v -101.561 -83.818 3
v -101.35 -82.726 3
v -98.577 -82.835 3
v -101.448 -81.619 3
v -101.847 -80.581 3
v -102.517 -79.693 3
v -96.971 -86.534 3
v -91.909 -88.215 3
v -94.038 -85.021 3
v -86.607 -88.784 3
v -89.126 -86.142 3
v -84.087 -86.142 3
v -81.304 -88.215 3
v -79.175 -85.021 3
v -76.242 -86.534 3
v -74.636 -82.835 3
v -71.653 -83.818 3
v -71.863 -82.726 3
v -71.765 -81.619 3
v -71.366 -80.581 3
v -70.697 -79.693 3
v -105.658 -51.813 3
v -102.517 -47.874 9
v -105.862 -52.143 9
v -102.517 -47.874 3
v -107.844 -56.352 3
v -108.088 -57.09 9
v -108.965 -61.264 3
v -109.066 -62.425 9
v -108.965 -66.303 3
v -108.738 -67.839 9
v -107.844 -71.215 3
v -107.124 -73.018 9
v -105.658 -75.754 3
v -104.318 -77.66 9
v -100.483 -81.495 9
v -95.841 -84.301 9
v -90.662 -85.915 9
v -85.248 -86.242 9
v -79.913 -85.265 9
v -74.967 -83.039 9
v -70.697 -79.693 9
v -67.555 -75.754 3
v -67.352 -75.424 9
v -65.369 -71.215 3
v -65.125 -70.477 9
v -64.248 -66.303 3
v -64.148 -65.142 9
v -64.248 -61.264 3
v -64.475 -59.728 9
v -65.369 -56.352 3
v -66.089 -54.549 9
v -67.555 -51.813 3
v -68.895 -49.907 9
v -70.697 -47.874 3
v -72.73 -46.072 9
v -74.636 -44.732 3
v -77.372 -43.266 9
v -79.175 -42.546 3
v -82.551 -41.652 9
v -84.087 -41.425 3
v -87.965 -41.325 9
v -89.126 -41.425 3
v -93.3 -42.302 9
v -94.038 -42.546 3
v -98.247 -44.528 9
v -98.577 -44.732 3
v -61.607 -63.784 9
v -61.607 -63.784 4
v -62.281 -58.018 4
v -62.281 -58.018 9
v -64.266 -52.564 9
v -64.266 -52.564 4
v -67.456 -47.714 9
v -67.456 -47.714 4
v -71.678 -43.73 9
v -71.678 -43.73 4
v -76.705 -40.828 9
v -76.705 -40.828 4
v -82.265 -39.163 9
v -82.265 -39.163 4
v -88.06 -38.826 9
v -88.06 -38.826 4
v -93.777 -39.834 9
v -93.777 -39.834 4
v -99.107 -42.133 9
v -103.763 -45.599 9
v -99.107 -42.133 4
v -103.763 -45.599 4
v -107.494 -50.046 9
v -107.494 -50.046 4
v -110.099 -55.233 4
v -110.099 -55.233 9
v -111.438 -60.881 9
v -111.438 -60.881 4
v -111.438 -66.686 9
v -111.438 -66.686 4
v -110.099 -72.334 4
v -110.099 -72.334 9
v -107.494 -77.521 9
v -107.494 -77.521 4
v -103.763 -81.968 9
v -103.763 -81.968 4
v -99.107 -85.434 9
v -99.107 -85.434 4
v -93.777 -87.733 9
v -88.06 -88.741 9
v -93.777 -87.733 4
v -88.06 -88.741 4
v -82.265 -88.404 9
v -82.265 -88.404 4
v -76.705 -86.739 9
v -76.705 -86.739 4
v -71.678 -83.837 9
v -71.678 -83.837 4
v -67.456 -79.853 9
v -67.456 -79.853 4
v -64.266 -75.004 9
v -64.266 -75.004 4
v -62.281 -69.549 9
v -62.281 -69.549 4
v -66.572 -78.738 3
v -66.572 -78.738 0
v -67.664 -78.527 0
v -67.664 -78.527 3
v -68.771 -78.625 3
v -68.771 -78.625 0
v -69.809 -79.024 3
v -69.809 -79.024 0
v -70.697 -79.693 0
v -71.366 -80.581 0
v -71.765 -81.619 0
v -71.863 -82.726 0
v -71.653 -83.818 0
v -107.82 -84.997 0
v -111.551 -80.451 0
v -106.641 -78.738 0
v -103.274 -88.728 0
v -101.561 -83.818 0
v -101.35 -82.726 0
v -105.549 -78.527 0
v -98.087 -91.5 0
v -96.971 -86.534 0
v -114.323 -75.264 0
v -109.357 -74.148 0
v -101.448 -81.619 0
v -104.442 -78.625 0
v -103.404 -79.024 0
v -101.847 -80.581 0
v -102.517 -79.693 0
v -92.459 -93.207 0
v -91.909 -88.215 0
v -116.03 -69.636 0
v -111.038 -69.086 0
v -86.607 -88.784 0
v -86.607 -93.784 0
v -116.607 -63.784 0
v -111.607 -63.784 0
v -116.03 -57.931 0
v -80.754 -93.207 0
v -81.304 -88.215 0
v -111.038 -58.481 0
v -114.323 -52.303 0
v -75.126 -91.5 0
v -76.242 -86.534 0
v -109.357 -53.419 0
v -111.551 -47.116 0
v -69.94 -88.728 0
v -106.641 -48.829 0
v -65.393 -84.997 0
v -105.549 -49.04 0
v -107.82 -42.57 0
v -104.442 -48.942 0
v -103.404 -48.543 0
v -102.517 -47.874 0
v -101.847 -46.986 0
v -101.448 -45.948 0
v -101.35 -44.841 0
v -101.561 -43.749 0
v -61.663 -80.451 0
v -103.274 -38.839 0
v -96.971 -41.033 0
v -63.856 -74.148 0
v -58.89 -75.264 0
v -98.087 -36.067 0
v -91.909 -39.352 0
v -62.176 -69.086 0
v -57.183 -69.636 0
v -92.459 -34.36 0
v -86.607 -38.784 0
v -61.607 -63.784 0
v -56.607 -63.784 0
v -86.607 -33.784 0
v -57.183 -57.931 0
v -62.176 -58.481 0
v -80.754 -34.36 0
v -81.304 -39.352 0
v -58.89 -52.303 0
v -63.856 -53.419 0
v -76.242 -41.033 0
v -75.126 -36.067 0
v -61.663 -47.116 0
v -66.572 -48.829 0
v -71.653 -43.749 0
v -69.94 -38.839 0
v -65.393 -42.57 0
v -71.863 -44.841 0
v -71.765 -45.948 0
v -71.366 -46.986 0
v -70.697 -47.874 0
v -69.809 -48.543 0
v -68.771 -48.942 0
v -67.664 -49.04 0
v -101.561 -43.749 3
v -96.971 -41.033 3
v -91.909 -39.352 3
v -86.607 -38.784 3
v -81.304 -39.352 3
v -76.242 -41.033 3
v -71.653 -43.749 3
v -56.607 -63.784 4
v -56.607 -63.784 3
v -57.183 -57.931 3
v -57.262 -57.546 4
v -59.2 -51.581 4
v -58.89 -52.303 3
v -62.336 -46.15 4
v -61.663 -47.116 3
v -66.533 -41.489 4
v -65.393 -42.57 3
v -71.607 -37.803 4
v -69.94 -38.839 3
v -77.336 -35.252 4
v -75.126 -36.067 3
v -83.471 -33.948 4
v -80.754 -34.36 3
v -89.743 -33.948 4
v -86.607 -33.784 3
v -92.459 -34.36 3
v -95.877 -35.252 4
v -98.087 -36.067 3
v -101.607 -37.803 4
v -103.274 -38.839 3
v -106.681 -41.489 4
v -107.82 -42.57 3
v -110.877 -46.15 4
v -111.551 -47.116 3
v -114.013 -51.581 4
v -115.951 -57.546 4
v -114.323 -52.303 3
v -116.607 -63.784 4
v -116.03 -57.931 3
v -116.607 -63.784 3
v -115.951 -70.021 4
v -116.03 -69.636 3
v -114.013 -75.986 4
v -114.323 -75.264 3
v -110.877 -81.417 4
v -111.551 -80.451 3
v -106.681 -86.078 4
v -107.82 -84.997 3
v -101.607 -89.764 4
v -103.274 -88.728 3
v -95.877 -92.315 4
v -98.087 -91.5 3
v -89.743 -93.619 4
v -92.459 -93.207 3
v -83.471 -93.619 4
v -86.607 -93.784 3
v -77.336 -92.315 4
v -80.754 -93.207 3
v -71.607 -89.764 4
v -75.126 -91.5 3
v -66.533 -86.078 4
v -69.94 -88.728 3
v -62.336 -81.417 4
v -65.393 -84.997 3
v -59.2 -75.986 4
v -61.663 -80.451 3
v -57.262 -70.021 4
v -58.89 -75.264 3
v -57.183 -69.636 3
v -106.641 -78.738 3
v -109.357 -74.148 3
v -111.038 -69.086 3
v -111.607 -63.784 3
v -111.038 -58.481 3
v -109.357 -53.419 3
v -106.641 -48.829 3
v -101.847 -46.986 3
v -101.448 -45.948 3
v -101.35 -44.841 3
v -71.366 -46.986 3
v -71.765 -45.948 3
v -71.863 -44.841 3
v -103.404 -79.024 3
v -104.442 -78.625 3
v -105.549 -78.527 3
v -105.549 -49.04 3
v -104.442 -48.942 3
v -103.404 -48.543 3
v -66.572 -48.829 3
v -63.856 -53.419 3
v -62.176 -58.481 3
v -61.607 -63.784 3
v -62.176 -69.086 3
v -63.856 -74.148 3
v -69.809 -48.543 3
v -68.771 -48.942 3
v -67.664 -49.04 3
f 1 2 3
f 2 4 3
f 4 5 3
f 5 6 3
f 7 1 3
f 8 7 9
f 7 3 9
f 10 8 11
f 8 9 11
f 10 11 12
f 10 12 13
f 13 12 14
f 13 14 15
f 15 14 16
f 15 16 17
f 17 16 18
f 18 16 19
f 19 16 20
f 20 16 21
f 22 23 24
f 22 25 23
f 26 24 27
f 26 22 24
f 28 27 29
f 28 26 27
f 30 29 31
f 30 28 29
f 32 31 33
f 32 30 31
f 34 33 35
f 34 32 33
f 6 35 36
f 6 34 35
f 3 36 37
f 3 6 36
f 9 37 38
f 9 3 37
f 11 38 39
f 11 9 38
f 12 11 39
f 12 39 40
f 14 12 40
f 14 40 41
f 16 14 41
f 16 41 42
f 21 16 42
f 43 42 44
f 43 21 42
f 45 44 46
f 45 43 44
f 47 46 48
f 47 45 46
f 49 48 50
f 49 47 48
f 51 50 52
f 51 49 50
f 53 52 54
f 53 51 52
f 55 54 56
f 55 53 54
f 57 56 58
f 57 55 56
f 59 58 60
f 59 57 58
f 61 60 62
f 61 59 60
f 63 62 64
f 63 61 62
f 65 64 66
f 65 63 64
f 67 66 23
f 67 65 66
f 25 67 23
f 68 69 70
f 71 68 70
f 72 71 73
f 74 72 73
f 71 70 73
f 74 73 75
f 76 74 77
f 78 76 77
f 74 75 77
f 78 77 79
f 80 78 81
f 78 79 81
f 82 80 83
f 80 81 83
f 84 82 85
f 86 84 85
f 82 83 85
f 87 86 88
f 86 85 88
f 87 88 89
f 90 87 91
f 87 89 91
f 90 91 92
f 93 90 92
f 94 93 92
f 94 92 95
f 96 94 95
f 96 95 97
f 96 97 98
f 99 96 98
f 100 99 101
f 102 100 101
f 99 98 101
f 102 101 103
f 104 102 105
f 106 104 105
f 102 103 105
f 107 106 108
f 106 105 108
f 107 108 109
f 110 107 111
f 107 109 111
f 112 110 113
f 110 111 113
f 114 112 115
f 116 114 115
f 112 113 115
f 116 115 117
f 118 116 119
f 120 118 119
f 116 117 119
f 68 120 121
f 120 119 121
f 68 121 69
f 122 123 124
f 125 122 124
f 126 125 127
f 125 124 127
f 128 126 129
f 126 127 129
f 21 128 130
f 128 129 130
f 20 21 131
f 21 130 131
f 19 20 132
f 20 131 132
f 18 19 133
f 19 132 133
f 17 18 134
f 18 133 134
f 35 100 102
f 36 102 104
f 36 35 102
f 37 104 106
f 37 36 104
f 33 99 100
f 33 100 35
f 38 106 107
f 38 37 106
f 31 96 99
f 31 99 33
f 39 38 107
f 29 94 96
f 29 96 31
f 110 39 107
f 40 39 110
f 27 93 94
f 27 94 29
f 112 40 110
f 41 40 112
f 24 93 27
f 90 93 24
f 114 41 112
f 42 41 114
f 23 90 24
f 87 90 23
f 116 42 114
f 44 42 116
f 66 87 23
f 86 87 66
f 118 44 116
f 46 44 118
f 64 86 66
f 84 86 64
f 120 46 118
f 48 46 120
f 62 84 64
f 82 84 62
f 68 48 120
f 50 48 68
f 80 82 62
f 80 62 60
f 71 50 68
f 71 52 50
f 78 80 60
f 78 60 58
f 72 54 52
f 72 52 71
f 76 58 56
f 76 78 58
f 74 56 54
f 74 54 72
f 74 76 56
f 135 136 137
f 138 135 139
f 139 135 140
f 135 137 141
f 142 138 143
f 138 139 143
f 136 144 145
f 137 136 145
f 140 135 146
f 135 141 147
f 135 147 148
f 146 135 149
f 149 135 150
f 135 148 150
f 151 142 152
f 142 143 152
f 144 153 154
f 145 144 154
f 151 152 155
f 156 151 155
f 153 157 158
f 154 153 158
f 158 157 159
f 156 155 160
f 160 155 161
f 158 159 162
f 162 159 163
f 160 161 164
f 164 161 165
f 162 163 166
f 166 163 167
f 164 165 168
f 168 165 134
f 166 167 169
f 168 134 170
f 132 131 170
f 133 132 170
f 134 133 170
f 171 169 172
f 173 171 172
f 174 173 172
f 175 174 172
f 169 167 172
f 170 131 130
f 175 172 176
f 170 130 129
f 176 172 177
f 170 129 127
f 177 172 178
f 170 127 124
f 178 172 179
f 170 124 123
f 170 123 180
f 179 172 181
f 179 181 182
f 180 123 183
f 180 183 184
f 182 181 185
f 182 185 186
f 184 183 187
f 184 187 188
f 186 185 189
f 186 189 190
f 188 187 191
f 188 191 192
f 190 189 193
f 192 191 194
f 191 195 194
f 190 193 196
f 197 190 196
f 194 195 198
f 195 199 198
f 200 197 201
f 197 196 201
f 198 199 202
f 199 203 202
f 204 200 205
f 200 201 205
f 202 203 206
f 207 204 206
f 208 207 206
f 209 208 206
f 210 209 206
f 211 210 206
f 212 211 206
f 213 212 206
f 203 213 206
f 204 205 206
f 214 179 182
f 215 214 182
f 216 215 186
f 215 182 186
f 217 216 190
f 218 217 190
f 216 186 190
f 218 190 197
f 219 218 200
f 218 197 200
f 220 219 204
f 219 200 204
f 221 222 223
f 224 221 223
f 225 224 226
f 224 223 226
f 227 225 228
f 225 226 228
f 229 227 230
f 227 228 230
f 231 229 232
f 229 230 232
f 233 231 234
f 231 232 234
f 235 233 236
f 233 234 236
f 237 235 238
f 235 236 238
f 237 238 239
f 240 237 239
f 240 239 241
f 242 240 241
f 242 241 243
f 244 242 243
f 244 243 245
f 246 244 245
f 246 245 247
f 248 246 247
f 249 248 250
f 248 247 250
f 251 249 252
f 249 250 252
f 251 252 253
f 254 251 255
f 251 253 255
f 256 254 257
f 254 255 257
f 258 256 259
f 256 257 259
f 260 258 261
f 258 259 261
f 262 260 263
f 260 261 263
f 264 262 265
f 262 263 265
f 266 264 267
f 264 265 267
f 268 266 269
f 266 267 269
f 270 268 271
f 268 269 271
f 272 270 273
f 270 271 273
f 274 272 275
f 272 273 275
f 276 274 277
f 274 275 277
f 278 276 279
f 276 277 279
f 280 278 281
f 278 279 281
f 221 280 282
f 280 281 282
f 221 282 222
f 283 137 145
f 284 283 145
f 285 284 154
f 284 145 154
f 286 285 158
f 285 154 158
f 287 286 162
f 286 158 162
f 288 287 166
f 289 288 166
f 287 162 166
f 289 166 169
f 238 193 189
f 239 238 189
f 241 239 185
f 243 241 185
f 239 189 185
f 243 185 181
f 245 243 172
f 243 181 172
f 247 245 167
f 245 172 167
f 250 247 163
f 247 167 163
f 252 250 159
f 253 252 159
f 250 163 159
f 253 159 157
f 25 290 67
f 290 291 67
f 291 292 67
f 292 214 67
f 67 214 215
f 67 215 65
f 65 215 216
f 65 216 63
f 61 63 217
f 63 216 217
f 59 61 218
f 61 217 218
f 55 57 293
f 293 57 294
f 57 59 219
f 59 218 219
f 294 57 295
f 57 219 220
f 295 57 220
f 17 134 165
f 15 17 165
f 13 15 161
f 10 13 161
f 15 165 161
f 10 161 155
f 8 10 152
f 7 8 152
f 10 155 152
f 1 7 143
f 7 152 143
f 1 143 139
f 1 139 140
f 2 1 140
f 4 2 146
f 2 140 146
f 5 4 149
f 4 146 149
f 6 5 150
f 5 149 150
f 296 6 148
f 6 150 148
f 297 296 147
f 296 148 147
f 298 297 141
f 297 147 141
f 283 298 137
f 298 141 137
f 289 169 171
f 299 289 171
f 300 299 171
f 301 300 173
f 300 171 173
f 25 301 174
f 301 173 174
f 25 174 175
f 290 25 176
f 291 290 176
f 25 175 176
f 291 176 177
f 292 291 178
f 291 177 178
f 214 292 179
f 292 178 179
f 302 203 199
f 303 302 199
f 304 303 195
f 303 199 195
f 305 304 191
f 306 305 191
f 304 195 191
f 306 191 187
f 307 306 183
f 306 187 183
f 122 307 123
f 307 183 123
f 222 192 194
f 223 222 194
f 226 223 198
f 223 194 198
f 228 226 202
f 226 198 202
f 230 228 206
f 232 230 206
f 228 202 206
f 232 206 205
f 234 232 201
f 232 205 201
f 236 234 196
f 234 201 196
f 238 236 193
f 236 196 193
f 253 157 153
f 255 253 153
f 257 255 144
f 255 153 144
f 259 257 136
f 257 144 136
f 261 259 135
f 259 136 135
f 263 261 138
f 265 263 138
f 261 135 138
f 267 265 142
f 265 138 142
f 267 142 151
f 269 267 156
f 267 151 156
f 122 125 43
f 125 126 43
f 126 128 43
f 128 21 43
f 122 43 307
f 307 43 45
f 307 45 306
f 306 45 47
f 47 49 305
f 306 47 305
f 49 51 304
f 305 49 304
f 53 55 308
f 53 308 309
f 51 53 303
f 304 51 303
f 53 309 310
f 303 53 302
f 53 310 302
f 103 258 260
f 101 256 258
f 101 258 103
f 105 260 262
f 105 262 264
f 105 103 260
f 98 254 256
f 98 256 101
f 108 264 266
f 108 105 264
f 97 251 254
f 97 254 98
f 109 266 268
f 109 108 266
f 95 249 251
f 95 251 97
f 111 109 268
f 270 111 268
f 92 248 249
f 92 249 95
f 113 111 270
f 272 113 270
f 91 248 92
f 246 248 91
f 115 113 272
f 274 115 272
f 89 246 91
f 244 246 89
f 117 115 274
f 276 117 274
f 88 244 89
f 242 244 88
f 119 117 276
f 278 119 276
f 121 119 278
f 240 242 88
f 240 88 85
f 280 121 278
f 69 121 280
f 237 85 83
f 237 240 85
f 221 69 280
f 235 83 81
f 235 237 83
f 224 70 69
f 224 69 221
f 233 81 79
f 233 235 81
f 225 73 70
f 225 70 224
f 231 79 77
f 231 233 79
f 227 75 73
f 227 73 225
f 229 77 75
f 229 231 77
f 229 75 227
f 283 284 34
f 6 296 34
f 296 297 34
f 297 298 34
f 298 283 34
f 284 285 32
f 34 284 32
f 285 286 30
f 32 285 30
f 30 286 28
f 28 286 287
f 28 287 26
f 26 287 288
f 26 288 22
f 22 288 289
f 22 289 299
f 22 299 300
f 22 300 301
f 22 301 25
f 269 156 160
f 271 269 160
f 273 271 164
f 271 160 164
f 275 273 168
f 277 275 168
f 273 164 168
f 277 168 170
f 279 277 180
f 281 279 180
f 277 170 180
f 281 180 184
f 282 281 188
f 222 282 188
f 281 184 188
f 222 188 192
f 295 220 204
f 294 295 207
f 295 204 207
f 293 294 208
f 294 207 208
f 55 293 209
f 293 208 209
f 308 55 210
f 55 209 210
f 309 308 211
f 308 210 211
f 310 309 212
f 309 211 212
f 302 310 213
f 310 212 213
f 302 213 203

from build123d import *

# Parameters (mm, degrees)
EXTRUDE_1_DEPTH = 3
SKETCH_3_R      = 30
SKETCH_3_R_2    = 22.5
EXTRUDE_2_DEPTH = 1
SKETCH_4_R      = 25
SKETCH_4_R_2    = 22.5
EXTRUDE_3_DEPTH = 5


with BuildPart() as part:
    # 草图2 → 凸台-拉伸1 (new body)
    with BuildSketch(Plane.XY):
        with BuildLine():
            ThreePointArc((-116.606649797, -63.783530386), (-107.819853233, -84.996733821), (-86.606649797, -93.783530386))
            ThreePointArc((-86.606649797, -93.783530386), (-65.393446361, -84.996733821), (-56.606649797, -63.783530386))
            ThreePointArc((-56.606649797, -63.783530386), (-65.393446361, -42.57032695), (-86.606649797, -33.783530386))
            ThreePointArc((-86.606649797, -33.783530386), (-107.819853233, -42.57032695), (-116.606649797, -63.783530386))
        make_face()
        with BuildLine():
            ThreePointArc((-106.640989146, -48.829425703), (-102.516552374, -47.873627809), (-101.56075448, -43.749191037))
            ThreePointArc((-101.56075448, -43.749191037), (-86.606649797, -38.783530386), (-71.652545115, -43.749191037))
            ThreePointArc((-71.652545115, -43.749191037), (-70.69674722, -47.873627809), (-66.572310448, -48.829425703))
            ThreePointArc((-66.572310448, -48.829425703), (-61.606649797, -63.783530386), (-66.572310448, -78.737635068))
            ThreePointArc((-66.572310448, -78.737635068), (-70.69674722, -79.693432962), (-71.652545115, -83.817869734))
            ThreePointArc((-71.652545115, -83.817869734), (-86.606649797, -88.783530386), (-101.56075448, -83.817869734))
            ThreePointArc((-101.56075448, -83.817869734), (-102.516552374, -79.693432962), (-106.640989146, -78.737635068))
            ThreePointArc((-106.640989146, -78.737635068), (-111.606649797, -63.783530386), (-106.640989146, -48.829425703))
        make_face(mode=Mode.SUBTRACT)
    extrude(amount=EXTRUDE_1_DEPTH)

    # 草图3 → 凸台-拉伸2 (add)
    with BuildSketch(Plane.XY.offset(3)):
        with Locations((-86.606649797, -63.783530386)):
            Circle(SKETCH_3_R)
        with Locations(Location((-86.606649797, -63.783530386, 0), (0, 0, 135))):
            Circle(SKETCH_3_R_2, mode=Mode.SUBTRACT)
    extrude(amount=EXTRUDE_2_DEPTH)

    # 草图4 → 凸台-拉伸3 (add)
    with BuildSketch(Plane.XY.offset(4)):
        with Locations((-86.606649797, -63.783530386)):
            Circle(SKETCH_4_R)
        with Locations(Location((-86.606649797, -63.783530386, 0), (0, 0, 135))):
            Circle(SKETCH_4_R_2, mode=Mode.SUBTRACT)
    extrude(amount=EXTRUDE_3_DEPTH)


solid = part.part
